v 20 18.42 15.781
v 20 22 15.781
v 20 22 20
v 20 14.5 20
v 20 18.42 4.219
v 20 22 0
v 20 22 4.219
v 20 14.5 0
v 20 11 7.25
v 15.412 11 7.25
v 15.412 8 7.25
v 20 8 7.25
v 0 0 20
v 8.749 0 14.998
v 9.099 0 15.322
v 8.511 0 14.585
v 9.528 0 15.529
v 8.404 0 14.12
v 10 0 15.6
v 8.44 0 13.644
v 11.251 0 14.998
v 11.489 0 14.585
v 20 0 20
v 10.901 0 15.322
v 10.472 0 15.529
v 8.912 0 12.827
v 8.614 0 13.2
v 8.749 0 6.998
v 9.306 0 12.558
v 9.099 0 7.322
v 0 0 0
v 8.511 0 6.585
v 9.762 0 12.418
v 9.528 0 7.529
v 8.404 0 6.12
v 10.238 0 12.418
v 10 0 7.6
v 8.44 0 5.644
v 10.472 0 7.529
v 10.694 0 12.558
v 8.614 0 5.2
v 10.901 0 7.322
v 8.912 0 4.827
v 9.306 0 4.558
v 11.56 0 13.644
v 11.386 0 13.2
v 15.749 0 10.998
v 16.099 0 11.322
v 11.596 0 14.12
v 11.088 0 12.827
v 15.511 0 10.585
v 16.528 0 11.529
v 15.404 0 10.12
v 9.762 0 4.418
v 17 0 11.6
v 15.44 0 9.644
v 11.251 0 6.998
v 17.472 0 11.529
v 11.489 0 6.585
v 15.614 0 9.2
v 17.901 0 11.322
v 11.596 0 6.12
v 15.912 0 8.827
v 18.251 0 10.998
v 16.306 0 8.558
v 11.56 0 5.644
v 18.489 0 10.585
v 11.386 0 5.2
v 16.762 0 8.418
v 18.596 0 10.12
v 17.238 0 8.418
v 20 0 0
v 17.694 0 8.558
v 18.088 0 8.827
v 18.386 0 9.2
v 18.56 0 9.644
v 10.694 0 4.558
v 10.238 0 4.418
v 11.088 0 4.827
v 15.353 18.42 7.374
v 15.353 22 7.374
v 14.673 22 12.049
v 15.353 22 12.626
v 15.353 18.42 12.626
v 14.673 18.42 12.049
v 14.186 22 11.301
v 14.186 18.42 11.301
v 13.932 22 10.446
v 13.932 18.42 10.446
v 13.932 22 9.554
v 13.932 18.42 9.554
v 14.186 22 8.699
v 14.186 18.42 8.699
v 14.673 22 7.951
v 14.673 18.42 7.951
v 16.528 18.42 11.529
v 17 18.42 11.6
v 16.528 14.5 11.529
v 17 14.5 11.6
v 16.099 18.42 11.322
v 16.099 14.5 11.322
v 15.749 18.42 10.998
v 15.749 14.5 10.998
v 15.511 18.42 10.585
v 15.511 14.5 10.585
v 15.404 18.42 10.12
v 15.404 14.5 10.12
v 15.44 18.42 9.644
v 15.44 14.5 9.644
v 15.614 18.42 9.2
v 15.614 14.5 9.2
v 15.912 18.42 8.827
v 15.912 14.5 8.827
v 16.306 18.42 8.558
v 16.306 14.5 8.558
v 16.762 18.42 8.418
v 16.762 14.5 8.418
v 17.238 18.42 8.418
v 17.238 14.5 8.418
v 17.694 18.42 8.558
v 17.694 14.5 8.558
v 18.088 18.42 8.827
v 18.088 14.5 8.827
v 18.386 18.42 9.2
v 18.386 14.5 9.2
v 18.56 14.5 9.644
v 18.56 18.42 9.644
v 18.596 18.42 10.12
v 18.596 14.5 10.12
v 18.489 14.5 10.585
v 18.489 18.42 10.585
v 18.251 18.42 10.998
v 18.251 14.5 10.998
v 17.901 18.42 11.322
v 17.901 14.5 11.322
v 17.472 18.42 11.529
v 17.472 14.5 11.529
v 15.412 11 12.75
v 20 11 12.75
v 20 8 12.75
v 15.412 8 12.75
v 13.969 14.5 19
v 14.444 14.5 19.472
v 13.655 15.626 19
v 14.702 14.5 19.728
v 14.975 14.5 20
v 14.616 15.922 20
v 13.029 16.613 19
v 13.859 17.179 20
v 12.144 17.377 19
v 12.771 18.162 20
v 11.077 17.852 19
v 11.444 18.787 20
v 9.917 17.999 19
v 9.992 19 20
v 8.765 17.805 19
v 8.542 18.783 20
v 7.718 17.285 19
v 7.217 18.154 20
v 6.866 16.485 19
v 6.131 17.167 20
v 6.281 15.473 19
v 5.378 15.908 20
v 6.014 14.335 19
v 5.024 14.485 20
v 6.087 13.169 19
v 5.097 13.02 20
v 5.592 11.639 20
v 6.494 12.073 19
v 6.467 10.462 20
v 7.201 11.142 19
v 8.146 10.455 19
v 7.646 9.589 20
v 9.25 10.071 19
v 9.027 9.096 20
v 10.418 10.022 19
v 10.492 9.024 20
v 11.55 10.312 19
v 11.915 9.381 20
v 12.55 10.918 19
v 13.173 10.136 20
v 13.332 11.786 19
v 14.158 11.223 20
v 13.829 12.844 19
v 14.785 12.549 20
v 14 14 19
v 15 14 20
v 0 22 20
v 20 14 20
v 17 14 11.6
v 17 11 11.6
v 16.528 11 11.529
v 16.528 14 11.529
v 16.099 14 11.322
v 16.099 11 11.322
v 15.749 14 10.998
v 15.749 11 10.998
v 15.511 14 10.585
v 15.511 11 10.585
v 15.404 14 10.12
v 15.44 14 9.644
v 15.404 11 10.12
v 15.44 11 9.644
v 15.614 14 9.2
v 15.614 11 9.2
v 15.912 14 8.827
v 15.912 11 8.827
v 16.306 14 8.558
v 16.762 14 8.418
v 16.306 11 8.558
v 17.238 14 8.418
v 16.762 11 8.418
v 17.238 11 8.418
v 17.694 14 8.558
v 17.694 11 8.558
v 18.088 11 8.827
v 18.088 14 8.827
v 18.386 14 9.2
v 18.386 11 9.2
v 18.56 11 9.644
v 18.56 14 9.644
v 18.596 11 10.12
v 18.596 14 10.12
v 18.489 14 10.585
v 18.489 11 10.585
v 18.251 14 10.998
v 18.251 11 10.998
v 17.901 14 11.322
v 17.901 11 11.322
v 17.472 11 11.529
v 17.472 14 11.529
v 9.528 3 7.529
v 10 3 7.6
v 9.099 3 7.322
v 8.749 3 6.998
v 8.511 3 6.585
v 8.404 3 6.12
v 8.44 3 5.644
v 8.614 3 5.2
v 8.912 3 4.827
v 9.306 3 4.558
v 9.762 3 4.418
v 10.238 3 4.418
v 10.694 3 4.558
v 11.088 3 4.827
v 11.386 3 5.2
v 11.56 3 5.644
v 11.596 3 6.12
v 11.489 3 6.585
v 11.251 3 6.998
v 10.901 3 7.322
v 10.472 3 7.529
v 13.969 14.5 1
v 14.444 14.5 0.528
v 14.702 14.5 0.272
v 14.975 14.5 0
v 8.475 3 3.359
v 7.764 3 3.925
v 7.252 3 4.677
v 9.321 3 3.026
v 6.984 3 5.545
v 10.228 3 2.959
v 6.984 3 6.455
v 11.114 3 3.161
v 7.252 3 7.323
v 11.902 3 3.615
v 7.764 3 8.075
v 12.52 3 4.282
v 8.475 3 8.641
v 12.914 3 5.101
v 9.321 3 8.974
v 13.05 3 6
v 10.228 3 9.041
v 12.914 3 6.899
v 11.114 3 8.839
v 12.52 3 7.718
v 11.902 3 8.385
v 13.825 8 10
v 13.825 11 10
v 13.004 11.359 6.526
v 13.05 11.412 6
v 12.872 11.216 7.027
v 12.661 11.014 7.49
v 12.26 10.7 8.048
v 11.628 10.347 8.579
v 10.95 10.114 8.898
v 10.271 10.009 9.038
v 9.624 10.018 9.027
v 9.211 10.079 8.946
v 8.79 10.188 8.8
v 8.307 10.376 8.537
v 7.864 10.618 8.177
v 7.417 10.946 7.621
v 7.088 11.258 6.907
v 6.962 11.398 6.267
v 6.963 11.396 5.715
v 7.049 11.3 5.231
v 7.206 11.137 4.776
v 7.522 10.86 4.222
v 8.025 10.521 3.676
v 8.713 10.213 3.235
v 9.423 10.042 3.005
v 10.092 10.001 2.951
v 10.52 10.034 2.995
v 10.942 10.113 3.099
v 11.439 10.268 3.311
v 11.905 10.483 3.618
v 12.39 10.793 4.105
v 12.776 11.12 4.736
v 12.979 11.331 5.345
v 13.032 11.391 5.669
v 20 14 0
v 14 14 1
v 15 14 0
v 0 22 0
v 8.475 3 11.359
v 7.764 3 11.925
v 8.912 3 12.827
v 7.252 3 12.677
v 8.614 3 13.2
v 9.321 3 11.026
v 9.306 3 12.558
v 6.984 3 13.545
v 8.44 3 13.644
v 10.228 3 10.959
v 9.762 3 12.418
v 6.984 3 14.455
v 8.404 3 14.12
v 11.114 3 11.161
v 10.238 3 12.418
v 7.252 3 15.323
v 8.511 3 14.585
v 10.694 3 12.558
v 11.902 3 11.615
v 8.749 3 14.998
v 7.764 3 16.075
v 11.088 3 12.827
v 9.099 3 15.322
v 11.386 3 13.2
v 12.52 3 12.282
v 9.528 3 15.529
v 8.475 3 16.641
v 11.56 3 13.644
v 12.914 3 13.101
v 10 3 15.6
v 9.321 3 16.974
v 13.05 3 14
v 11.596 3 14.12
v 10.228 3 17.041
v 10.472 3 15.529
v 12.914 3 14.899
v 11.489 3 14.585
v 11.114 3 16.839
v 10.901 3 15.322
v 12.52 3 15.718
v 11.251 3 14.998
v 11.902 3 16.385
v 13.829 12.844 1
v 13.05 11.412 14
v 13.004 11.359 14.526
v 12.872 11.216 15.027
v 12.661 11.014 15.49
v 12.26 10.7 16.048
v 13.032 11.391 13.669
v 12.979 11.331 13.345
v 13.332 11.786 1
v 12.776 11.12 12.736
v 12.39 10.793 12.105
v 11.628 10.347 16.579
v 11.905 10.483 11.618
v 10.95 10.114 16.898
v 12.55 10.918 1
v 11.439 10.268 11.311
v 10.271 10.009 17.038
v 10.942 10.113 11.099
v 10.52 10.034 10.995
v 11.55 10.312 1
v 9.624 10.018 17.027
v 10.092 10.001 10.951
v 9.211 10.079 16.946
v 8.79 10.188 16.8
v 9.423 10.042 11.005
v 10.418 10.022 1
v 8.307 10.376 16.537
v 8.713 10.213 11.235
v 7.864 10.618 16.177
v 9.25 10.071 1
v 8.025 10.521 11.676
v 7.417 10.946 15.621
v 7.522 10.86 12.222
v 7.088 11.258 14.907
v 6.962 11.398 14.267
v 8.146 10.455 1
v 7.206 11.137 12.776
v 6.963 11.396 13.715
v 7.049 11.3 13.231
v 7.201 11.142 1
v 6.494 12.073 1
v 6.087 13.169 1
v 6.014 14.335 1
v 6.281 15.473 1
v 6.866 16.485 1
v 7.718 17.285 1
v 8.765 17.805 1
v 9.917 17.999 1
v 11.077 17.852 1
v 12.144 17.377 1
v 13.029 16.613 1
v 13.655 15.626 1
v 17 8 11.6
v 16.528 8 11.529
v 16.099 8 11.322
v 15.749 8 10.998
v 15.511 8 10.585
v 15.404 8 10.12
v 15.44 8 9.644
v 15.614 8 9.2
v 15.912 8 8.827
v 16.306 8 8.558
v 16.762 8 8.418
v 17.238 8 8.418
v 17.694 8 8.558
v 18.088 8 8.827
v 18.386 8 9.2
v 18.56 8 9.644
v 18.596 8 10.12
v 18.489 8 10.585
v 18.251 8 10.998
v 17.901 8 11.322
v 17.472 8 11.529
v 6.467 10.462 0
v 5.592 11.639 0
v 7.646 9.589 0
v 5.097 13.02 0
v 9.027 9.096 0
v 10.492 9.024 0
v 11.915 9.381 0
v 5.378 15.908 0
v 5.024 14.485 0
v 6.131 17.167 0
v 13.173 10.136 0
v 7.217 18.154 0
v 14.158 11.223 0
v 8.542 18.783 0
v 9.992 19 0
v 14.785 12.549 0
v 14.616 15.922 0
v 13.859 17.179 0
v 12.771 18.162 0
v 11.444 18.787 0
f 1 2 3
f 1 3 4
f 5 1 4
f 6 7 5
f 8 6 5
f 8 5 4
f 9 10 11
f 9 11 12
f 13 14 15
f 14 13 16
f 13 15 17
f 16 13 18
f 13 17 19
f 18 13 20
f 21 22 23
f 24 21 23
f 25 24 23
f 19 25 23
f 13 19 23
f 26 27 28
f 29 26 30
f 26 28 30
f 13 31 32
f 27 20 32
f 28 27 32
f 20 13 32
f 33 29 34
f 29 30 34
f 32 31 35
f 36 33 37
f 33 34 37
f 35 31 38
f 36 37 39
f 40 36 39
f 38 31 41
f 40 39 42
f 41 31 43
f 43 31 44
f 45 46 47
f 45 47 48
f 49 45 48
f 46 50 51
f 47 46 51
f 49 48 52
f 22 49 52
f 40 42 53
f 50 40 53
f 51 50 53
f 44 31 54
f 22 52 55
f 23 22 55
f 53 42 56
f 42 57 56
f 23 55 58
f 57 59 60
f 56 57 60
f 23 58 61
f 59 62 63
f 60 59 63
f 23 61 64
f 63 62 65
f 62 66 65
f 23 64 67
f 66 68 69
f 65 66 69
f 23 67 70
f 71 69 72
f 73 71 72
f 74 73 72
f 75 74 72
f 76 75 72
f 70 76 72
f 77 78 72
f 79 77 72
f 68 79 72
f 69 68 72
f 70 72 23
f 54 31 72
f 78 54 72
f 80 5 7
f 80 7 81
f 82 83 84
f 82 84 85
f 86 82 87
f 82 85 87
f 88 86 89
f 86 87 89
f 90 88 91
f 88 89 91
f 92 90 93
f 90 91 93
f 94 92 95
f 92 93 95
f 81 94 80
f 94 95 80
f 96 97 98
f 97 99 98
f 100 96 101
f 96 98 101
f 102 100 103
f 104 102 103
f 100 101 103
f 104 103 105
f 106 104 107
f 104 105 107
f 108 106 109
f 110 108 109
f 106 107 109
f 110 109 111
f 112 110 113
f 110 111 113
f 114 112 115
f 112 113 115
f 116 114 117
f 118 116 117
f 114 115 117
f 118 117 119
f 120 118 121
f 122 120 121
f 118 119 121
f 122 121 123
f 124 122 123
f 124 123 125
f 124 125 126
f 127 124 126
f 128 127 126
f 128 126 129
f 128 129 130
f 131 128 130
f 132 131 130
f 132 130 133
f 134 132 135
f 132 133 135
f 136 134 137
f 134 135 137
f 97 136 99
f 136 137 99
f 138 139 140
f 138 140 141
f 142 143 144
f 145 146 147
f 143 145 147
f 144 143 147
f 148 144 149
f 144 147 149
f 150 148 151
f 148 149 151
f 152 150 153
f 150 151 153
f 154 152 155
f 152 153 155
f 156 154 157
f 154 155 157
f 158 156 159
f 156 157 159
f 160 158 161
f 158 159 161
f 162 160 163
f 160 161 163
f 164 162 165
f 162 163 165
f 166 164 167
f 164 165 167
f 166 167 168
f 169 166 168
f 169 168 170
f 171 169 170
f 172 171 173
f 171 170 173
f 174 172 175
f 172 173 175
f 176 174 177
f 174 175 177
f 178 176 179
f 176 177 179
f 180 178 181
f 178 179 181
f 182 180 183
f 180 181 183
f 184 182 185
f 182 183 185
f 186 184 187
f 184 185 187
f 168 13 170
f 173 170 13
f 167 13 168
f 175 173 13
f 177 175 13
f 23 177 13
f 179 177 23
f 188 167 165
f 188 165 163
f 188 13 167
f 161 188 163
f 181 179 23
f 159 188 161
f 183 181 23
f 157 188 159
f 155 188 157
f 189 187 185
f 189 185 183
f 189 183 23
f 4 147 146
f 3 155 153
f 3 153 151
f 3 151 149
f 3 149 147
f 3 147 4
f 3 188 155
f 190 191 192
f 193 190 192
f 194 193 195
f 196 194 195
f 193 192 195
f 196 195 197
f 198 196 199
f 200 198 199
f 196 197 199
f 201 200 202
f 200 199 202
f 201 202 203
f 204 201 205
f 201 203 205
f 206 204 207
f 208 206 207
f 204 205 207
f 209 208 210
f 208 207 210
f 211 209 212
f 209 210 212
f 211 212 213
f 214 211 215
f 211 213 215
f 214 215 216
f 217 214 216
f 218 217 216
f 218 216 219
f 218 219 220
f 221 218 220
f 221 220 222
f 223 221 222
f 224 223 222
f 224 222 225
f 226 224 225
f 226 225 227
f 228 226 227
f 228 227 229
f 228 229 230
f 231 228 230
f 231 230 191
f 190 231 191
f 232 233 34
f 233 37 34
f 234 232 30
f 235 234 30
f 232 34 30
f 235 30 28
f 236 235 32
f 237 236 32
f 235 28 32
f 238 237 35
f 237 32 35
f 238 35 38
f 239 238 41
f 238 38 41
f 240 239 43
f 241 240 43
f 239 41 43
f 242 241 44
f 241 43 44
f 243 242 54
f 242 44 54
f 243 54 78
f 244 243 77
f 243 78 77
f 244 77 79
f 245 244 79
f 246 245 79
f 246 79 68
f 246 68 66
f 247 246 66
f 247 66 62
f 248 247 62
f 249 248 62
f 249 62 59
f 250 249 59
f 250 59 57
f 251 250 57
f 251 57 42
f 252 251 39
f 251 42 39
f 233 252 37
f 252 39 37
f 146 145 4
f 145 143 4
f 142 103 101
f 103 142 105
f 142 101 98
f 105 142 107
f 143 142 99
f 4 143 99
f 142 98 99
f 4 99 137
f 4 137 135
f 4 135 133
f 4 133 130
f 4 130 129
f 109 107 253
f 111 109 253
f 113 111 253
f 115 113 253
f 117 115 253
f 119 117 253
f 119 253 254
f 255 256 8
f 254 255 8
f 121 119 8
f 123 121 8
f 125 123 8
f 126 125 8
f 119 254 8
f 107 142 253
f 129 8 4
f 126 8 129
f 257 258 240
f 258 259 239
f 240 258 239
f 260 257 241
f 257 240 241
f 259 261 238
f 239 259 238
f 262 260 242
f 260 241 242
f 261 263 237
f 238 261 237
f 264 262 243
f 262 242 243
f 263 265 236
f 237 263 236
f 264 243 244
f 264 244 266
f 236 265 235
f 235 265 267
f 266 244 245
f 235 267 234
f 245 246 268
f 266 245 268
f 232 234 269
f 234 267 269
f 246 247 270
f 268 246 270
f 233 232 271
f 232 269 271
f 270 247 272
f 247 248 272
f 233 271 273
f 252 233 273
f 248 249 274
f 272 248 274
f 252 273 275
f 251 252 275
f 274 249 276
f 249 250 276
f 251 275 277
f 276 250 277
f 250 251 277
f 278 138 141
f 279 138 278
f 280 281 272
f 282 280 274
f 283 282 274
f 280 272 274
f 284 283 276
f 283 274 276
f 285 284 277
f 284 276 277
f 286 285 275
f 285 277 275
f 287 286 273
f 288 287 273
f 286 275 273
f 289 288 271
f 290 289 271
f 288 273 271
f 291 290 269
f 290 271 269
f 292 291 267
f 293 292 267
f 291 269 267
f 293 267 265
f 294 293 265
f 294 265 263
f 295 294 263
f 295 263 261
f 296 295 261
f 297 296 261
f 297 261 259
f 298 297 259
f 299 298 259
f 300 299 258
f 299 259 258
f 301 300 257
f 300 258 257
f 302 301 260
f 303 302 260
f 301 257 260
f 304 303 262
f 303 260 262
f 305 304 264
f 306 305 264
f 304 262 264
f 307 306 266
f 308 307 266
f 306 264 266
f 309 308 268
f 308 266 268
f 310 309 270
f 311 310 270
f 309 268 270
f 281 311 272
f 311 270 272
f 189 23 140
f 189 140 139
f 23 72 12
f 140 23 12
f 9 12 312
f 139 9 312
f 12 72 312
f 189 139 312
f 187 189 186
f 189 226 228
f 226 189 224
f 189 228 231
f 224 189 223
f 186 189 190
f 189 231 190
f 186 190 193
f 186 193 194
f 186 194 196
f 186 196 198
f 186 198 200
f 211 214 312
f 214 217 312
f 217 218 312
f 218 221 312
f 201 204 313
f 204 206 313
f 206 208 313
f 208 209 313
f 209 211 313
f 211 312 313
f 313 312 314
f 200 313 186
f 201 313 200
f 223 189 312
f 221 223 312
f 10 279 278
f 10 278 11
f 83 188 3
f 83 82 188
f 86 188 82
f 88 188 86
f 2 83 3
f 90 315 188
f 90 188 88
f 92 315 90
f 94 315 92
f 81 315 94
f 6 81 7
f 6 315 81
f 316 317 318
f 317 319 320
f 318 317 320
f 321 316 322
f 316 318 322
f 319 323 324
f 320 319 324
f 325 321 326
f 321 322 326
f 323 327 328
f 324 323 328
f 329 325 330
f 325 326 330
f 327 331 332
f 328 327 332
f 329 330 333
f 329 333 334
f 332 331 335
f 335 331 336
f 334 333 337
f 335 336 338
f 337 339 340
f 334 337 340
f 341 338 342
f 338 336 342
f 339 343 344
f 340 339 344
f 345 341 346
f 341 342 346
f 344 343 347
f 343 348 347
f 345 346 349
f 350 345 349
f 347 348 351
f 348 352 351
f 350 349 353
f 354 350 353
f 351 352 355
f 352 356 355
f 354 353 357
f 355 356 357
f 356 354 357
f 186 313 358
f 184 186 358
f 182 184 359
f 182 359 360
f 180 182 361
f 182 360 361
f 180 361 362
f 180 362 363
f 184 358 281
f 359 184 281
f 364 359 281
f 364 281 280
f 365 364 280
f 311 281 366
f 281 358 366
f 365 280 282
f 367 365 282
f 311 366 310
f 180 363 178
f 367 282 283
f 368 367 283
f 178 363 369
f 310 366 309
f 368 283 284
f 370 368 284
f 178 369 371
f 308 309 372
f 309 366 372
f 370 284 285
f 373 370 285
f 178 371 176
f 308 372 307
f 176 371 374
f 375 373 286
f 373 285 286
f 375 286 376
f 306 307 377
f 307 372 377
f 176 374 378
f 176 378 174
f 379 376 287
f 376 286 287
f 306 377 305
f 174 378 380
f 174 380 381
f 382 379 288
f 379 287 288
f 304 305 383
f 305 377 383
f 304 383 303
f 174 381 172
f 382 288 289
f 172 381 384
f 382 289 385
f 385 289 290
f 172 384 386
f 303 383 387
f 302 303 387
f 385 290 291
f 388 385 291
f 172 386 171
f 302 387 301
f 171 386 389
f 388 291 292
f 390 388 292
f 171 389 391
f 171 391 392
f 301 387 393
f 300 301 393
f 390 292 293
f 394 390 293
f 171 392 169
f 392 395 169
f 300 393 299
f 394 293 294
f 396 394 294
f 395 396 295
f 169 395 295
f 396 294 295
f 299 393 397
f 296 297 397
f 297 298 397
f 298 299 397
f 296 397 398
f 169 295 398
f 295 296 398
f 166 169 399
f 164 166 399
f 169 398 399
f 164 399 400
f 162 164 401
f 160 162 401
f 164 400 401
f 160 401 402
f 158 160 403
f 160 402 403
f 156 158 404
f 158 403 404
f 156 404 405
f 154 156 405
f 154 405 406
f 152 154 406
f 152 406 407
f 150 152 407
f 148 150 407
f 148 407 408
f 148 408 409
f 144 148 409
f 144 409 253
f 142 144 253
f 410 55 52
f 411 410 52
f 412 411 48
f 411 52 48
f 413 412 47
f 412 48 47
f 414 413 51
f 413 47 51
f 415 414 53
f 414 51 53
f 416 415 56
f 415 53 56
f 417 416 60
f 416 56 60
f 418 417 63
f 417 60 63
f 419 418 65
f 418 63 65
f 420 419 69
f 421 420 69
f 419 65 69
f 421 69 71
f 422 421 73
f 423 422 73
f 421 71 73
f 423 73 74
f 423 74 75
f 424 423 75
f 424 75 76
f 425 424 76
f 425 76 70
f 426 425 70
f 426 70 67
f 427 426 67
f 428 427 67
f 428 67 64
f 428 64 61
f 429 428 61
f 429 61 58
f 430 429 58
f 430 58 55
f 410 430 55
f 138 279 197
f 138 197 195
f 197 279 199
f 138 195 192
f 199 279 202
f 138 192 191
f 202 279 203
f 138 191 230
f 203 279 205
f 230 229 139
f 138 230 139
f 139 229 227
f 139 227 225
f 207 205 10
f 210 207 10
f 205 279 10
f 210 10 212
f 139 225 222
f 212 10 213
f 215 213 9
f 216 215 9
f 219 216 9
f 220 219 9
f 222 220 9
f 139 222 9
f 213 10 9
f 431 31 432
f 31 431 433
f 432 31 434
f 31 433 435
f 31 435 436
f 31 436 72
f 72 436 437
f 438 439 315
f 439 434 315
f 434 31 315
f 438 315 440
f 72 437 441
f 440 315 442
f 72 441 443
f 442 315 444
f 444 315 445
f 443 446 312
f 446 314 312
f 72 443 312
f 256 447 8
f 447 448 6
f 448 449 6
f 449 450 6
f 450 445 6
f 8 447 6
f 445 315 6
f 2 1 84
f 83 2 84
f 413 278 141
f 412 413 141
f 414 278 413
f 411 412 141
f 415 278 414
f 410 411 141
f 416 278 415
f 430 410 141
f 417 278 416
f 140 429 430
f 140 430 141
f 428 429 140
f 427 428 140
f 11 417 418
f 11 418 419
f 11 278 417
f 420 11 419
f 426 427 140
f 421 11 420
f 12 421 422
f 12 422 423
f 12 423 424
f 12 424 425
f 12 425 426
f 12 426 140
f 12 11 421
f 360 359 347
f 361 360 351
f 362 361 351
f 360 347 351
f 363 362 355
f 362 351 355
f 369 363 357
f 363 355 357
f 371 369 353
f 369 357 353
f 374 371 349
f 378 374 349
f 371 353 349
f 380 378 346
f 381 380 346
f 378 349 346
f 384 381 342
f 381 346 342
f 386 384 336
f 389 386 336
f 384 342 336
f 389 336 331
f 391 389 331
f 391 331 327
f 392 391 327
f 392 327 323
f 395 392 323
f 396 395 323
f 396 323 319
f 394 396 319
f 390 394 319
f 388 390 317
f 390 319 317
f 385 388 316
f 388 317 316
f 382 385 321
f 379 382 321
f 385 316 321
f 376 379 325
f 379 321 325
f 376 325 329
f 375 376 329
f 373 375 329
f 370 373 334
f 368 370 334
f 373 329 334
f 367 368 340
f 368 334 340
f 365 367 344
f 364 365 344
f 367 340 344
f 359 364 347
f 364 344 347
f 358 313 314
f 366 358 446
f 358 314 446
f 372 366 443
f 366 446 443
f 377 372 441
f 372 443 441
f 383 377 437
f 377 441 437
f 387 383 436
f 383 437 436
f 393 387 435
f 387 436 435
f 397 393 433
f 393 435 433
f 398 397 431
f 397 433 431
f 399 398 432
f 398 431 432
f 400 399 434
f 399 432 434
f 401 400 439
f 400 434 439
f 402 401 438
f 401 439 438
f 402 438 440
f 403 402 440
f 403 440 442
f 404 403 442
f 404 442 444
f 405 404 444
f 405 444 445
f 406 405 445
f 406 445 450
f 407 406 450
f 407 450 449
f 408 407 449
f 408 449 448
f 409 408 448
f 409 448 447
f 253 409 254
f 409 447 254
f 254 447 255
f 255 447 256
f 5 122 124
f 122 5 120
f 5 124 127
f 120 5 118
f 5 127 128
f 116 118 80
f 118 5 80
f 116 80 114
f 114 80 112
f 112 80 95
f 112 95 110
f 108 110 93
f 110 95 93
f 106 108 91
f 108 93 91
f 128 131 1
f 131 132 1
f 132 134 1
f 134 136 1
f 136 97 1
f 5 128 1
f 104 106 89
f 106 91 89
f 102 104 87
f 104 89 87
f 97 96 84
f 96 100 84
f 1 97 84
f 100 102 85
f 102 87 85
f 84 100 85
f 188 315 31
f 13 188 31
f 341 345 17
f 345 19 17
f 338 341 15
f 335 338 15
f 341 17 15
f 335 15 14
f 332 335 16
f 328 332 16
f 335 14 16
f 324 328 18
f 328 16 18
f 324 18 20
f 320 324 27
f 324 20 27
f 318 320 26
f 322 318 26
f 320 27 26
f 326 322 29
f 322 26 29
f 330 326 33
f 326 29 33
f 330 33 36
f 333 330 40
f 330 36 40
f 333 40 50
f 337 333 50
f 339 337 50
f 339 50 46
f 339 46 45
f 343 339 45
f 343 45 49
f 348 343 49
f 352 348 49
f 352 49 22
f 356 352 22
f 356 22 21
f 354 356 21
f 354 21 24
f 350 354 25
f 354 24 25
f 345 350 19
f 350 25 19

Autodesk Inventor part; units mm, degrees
ref_plane "YZ Plane" through (0, 0, 0) normal (1, 0, 0) x (0, 1, 0)
sketch "Sketch1" plane through (0, 0, 0) normal (0, 0, 1) x (1, 0, 0)
  line L0 (0, 0) -> (20, 0)
  line L1 (20, 0) -> (20, 14)
  line L2 (20, 14) -> (0, 14)
  line L3 (0, 14) -> (0, 0)
  circle A0 centre (10, 14) radius 4
  line L4 (7.9329, 10) -> (16.1844, 10) construction
  line L5 (6, 14) -> (0, 14)
  line L6 (14, 14) -> (20, 14)
  line L7 (20, 14) -> (0, 14)
  line L8 (0, 14) -> (0, 22)
  line L9 (0, 22) -> (20, 22)
  line L10 (20, 22) -> (20, 14)
  line L11 (20, 13.5) -> (13.9686, 13.5)
  line L12 (13.9686, 13.5) -> (13.9686, 14.5)
  line L13 (13.9686, 14.5) -> (20, 14.5)
  line L14 (20, 14.5) -> (20, 13.5)
  point P0 (20, 7)
  point P1 (0, 7)
  point P2 (17, 14)
  point P3 (3, 14)
  point P4 (13.9686, 14)
  point P5 (0, 14)
  dimension "d0" = 8
  dimension "d1" = 10
  dimension "d2" = 20
  dimension "d5" = 8
  dimension "d6" = 1
extrude "Extrusion1" add sketch "Sketch1" along normal blind 20 contours L3 L2 A0 L11 L1 L0 | L8 L9 L10 L13 A0 L2 | L11 A0 L2 L1
chamfer "Chamfer1" distance 1 angle 45 2 edges at (6.0079, 13.7495, 0) (6.0079, 13.7495, 20)
ref_plane "Work Plane1" through (20, 11, 20) normal (0, 1, 0) x (1, 0, 0)
sketch "Sketch2" plane through (0, 22, 0) normal (0, 1, 0) x (1, 0, 0)
  line L0 (15, -20) -> (14, -19) projected
  line L1 (20, -20) -> (15, -20) projected
  line L2 (20, 0) -> (20, -20) projected
  line L3 (20, 0) -> (15, 0) projected
  line L4 (14, -1) -> (15, 0) projected
  line L5 (14, -1) -> (14, -19) projected
  line L6 (14, -15.8523) -> (20, -15.8523)
  line L7 (15.4123, -7.25) -> (18.5877, -7.25)
  line L8 (18.5877, -7.25) -> (20.1754, -10) construction
  line L9 (20.1754, -10) -> (18.5877, -12.75) construction
  line L10 (18.5877, -12.75) -> (15.4123, -12.75)
  line L11 (15.4123, -12.75) -> (13.8246, -10)
  line L12 (13.8246, -10) -> (15.4123, -7.25)
  line L13 (18.5877, -12.75) -> (22.4339, -12.75)
  line L14 (22.4339, -12.75) -> (22.4339, -7.25)
  line L15 (22.4339, -7.25) -> (18.5877, -7.25)
  line L16 (18.5877, -7.25) -> (18.5877, -12.75) construction
  point P0 (0, 0)
  point P1 (17, -10)
  point P2 (20, -10)
  point P3 (17, -15.8523)
  point P4 (17, -10)
  dimension "d10" = 5.5
extrude "Extrusion2" cut sketch "Sketch2" against normal blind 3 from surface at -11 contours L11 L12 L5 | L5 L12 L7 L15 L2 L13 L10 L11 | L2 L15 L14 L13
hole "Hole1" at (17, 22, 10) direction (0, -1, 0) diameter 3.2 end through all counterbore diameter 6.2 counterbore depth 3.58
chamfer "Chamfer2" distance 5 angle 45 2 edges at (20, 20.21, 9.219) (20, 20.21, 10.781)
ref_plane "Work Plane2" through (10, 10, 0) normal (0, -1, 0) x (1, 0, 0)
sketch "Sketch3" plane through (10, 10, 0) normal (0, -1, 0) x (1, 0, 0)
  line L0 (-5, 0) -> (5, 0) projected
  line L1 (5, 20) -> (-5, 20) projected
  line L2 (-10, 20) -> (10, 20) projected
  line L3 (0, 20) -> (0, 0)
  circle A0 centre (0, 14) radius 3.05
  circle A1 centre (0, 6) radius 3.05
  point P0 (-10, 0)
  point P1 (4.9749, 0)
  point P2 (4.9749, 20)
  dimension "d24" = 6.1
  dimension "d25" = 6.1
  dimension "d26" = 6
  dimension "d27" = 6
extrude "Extrusion3" cut sketch "Sketch3" along normal blind 7 and the other way blind 2
hole "Hole2" at (10, 10, 6) at (10, 10, 14) direction (0, -1, 0) diameter 3.2 end through all
equation "\"d27\" = d26"
properties part number "Y Rod Holder"
